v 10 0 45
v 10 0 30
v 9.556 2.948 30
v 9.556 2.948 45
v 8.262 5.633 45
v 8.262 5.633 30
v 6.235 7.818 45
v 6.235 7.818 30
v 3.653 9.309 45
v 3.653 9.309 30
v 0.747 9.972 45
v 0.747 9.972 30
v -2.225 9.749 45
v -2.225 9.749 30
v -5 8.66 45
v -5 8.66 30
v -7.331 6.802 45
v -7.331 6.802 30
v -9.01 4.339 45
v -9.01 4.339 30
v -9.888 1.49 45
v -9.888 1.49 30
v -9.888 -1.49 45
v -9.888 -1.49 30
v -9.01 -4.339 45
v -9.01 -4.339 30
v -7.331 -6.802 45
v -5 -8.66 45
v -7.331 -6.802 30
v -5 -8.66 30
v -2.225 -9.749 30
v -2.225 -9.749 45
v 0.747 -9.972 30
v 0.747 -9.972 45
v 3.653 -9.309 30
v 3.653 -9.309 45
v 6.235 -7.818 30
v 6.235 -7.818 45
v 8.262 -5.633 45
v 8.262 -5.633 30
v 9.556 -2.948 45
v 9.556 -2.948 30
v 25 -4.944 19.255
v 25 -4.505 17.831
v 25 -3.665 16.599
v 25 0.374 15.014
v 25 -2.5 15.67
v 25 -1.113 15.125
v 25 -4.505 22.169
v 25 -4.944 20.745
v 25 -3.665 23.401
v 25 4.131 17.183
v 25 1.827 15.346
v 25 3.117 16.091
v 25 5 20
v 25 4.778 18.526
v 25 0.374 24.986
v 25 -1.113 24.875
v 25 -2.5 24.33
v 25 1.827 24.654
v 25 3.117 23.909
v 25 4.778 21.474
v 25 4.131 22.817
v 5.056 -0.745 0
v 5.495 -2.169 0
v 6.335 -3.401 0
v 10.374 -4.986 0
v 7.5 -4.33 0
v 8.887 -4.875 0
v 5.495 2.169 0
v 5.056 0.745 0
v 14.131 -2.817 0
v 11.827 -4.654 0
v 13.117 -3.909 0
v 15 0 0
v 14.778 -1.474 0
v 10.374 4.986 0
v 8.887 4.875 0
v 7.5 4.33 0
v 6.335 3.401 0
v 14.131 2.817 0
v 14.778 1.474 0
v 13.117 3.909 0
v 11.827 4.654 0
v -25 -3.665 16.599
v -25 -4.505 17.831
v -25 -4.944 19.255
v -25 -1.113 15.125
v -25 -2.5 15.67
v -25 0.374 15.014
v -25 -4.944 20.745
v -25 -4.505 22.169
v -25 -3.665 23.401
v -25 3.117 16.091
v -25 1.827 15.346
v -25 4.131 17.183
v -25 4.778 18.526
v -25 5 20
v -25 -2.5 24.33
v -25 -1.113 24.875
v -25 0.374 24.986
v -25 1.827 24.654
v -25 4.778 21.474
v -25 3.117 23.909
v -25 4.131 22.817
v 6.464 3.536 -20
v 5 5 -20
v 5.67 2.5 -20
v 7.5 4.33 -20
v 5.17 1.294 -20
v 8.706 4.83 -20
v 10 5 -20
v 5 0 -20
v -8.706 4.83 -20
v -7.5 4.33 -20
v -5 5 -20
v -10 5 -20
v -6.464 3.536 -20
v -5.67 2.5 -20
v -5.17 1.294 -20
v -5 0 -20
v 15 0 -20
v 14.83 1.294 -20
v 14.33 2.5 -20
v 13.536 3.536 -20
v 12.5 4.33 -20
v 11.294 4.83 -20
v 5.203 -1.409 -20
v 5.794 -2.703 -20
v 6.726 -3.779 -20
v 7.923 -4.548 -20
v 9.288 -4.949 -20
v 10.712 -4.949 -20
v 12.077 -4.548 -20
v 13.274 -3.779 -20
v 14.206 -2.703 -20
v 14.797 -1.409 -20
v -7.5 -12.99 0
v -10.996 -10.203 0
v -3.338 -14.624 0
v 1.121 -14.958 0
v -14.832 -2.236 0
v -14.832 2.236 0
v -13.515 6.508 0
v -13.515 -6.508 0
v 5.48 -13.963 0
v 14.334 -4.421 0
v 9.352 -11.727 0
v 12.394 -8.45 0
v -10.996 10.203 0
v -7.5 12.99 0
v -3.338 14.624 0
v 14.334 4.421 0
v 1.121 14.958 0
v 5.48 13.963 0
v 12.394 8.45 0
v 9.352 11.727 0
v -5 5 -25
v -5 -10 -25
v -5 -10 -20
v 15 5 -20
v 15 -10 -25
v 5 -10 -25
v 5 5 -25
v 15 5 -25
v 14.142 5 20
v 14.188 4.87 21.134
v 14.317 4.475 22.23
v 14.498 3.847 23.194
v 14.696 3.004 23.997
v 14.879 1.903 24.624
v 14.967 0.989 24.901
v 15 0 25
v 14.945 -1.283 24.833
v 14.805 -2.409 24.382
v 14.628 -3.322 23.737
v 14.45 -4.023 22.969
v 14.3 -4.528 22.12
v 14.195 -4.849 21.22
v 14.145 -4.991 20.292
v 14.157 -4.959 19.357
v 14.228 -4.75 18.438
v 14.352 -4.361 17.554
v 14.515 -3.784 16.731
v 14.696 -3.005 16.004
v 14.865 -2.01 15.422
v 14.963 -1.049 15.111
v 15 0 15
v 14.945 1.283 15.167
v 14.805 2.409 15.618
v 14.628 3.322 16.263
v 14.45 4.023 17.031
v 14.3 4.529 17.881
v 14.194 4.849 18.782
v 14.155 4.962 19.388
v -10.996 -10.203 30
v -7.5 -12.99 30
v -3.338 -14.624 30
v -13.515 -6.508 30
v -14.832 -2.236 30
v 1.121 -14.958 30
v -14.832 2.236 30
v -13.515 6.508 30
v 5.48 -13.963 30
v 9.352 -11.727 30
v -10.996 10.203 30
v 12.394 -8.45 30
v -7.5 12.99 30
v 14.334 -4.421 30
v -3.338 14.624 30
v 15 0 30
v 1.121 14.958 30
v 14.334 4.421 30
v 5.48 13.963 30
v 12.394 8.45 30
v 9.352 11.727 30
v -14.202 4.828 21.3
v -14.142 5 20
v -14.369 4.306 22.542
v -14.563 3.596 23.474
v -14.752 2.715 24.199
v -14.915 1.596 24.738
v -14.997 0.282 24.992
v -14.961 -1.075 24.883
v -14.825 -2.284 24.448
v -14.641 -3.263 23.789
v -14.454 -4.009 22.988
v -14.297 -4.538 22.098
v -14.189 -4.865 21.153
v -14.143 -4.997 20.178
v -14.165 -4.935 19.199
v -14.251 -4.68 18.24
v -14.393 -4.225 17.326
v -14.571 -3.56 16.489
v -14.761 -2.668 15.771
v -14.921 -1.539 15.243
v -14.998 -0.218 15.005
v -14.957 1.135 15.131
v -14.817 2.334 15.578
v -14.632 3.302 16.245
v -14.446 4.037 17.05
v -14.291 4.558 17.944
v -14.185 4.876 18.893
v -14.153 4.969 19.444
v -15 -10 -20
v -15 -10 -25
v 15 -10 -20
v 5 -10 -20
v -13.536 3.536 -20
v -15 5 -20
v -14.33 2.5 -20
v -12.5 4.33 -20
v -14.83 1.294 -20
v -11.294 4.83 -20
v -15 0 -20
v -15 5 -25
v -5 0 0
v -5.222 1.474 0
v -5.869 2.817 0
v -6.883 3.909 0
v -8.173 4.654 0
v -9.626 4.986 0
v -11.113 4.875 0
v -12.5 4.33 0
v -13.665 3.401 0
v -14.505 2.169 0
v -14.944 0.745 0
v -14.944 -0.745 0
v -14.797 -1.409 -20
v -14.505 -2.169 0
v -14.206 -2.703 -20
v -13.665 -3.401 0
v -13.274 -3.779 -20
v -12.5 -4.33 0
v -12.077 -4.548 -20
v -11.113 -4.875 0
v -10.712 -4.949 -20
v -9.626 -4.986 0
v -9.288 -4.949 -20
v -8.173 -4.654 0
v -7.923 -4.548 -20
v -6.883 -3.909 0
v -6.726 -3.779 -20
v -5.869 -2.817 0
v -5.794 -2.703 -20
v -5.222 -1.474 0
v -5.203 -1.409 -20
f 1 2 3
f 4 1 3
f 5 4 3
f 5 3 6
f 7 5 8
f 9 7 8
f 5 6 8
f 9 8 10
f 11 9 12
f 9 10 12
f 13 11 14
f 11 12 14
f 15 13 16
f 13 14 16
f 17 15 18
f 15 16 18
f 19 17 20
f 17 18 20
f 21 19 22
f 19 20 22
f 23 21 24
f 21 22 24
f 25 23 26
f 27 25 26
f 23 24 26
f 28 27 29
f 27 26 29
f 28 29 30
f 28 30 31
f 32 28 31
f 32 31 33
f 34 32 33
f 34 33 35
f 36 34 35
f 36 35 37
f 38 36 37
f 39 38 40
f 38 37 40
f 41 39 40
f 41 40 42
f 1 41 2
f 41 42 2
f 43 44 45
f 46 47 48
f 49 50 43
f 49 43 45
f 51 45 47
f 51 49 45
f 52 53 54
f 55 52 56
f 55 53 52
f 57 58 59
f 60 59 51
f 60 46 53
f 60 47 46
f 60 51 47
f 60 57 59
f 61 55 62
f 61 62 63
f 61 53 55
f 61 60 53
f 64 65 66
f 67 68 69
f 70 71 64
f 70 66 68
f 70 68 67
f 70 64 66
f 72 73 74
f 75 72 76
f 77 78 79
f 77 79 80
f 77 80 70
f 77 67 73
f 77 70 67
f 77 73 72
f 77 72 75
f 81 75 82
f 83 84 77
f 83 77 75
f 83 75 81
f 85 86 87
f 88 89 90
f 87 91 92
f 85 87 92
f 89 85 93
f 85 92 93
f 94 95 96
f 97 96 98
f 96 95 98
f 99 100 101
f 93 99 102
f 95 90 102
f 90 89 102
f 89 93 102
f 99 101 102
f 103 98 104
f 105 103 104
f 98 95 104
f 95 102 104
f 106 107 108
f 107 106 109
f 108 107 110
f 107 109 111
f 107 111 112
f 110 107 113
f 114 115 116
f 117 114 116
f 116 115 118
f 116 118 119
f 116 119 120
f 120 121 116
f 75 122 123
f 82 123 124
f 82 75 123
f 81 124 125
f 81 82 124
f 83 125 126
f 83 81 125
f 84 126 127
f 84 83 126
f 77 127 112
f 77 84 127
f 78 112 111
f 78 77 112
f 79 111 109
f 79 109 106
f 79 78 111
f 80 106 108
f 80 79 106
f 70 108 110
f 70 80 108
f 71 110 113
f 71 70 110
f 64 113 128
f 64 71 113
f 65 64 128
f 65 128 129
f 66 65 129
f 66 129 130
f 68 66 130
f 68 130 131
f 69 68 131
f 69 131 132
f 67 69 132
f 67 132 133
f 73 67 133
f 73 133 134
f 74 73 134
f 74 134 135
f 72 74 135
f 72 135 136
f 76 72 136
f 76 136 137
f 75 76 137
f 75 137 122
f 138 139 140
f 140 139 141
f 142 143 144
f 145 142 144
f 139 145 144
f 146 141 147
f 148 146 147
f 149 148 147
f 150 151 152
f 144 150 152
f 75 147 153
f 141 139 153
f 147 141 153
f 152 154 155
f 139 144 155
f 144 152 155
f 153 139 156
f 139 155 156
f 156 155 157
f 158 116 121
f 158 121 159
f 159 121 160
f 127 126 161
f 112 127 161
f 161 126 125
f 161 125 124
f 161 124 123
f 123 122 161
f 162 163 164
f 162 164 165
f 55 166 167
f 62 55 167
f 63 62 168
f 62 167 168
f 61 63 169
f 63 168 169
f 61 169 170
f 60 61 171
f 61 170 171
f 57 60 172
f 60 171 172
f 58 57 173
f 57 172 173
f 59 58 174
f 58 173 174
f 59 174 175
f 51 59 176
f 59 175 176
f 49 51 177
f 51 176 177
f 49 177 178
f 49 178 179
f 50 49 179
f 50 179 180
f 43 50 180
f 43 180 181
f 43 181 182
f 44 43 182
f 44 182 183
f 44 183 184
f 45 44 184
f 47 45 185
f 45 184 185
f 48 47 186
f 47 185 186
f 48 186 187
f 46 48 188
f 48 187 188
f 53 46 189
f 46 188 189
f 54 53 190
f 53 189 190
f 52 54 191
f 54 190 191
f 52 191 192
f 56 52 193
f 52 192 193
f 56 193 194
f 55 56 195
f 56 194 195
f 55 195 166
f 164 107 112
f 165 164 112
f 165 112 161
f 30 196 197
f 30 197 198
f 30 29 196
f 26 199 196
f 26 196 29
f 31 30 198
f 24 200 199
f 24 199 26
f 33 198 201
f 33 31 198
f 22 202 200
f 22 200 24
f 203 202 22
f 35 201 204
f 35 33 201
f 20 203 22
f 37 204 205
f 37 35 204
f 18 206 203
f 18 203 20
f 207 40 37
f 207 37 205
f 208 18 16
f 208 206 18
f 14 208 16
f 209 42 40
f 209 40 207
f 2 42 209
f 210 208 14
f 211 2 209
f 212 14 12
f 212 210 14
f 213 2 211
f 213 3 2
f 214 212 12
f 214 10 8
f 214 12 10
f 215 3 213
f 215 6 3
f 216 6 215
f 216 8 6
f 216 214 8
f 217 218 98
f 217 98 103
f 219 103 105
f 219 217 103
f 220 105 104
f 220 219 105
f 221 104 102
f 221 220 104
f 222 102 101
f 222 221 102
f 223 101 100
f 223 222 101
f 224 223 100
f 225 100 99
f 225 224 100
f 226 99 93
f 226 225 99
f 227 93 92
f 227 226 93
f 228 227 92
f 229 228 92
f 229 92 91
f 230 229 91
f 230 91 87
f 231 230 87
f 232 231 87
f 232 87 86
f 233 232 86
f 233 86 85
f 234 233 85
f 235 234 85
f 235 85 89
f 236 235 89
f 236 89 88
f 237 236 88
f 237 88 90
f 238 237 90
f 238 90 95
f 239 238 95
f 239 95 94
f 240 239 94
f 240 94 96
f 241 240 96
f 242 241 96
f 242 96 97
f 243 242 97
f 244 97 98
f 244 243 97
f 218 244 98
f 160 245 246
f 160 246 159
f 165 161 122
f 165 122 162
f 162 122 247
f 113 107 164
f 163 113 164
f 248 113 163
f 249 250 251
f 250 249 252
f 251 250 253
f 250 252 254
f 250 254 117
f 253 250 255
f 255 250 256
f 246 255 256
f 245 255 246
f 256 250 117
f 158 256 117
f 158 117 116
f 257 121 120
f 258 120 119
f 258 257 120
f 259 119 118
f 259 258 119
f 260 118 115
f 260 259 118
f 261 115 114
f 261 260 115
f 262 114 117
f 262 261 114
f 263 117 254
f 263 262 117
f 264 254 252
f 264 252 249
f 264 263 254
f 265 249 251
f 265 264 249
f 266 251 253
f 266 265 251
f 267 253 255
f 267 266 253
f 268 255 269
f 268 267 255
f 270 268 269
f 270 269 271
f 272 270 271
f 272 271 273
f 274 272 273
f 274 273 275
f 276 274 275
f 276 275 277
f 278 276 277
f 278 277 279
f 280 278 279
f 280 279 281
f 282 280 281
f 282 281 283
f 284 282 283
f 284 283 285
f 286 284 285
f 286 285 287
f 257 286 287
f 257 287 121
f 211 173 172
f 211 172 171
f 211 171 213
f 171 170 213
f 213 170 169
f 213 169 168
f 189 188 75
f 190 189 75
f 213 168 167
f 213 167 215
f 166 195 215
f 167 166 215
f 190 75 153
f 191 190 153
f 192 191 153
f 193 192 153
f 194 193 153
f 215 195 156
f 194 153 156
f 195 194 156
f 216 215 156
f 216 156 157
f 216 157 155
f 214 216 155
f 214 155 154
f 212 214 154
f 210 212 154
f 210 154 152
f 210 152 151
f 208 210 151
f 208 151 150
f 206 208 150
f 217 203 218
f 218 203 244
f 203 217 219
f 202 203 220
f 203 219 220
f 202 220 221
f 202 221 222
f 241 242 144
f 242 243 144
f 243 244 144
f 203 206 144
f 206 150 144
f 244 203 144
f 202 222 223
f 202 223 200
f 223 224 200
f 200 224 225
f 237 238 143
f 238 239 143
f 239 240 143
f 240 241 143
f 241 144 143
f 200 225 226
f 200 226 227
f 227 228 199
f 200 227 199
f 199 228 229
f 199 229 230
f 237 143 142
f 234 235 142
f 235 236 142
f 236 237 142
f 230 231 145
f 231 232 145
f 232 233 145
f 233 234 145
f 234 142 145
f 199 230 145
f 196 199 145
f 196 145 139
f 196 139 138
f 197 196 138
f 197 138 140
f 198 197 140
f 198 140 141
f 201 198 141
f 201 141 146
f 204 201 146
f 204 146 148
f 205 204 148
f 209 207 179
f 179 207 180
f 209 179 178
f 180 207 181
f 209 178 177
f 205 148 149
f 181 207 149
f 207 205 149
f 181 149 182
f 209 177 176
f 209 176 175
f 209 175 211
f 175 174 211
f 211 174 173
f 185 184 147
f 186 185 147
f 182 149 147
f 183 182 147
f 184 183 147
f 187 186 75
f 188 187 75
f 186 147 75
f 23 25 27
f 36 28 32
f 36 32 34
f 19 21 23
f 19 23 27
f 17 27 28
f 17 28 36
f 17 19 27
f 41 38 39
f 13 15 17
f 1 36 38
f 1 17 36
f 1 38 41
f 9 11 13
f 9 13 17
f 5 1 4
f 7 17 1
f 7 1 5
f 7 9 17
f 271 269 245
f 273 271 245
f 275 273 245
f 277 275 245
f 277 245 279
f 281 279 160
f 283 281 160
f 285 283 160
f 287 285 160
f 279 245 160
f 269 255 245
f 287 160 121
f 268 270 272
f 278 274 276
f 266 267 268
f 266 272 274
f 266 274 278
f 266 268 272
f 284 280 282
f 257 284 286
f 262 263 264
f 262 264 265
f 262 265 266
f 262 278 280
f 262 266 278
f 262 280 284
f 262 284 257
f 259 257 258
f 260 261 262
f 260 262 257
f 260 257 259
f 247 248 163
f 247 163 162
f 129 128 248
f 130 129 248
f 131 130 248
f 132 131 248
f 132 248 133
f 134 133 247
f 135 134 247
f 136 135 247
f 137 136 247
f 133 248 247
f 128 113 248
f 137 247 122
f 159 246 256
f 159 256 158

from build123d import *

# Parameters (mm, degrees)
F0_R      = 5
F1_DEPTH  = 20
F2_R      = 15
F3_DEPTH  = 30
F4_R      = 5
F5_DEPTH  = 25
F6_R      = 5
F7_DEPTH  = 25
F8_R      = 10
F9_DEPTH  = 15
F10_W     = 10
F10_H     = 15
F11_DEPTH = 5
F12_W     = 10
F12_H     = 15
F13_DEPTH = 5


with BuildPart() as f1:
    # F0 (on Top) → F1 (new body)
    with BuildSketch(Plane.XY):
        with Locations((10, 0)):
            Circle(F0_R)
        with Locations((-10, 0)):
            Circle(F0_R)
    extrude(amount=-F1_DEPTH)

    # F10 (on face) → F11 (join)
    with BuildSketch(Plane(origin=(0, 0, -20), x_dir=(1, 0, 0), z_dir=(0, 0, -1))):
        with Locations((-10, 2.5)):
            Rectangle(F10_W, F10_H)
    extrude(amount=F11_DEPTH)

    # F12 (on face) → F13 (join)
    with BuildSketch(Plane(origin=(0, 0, -20), x_dir=(1, 0, 0), z_dir=(0, 0, -1))):
        with Locations((10, 2.5)):
            Rectangle(F12_W, F12_H)
    extrude(amount=F13_DEPTH)


with BuildPart() as f3:
    # F2 (on Top) → F3 (new body)
    with BuildSketch(Plane.XY):
        Circle(F2_R)
    extrude(amount=F3_DEPTH)

    # F4 (on Right) → F5 (join)
    with BuildSketch(Plane.YZ):
        with Locations((0, 20)):
            Circle(F4_R)
    extrude(amount=F5_DEPTH)

    # F6 (on Right) → F7 (join)
    with BuildSketch(Plane.YZ):
        with Locations((0, 20)):
            Circle(F6_R)
    extrude(amount=-F7_DEPTH)

    # F8 (on face) → F9 (join)
    with BuildSketch(Plane.XY.offset(30)):
        Circle(F8_R)
    extrude(amount=F9_DEPTH)


solid = Compound([f1.part, f3.part])
